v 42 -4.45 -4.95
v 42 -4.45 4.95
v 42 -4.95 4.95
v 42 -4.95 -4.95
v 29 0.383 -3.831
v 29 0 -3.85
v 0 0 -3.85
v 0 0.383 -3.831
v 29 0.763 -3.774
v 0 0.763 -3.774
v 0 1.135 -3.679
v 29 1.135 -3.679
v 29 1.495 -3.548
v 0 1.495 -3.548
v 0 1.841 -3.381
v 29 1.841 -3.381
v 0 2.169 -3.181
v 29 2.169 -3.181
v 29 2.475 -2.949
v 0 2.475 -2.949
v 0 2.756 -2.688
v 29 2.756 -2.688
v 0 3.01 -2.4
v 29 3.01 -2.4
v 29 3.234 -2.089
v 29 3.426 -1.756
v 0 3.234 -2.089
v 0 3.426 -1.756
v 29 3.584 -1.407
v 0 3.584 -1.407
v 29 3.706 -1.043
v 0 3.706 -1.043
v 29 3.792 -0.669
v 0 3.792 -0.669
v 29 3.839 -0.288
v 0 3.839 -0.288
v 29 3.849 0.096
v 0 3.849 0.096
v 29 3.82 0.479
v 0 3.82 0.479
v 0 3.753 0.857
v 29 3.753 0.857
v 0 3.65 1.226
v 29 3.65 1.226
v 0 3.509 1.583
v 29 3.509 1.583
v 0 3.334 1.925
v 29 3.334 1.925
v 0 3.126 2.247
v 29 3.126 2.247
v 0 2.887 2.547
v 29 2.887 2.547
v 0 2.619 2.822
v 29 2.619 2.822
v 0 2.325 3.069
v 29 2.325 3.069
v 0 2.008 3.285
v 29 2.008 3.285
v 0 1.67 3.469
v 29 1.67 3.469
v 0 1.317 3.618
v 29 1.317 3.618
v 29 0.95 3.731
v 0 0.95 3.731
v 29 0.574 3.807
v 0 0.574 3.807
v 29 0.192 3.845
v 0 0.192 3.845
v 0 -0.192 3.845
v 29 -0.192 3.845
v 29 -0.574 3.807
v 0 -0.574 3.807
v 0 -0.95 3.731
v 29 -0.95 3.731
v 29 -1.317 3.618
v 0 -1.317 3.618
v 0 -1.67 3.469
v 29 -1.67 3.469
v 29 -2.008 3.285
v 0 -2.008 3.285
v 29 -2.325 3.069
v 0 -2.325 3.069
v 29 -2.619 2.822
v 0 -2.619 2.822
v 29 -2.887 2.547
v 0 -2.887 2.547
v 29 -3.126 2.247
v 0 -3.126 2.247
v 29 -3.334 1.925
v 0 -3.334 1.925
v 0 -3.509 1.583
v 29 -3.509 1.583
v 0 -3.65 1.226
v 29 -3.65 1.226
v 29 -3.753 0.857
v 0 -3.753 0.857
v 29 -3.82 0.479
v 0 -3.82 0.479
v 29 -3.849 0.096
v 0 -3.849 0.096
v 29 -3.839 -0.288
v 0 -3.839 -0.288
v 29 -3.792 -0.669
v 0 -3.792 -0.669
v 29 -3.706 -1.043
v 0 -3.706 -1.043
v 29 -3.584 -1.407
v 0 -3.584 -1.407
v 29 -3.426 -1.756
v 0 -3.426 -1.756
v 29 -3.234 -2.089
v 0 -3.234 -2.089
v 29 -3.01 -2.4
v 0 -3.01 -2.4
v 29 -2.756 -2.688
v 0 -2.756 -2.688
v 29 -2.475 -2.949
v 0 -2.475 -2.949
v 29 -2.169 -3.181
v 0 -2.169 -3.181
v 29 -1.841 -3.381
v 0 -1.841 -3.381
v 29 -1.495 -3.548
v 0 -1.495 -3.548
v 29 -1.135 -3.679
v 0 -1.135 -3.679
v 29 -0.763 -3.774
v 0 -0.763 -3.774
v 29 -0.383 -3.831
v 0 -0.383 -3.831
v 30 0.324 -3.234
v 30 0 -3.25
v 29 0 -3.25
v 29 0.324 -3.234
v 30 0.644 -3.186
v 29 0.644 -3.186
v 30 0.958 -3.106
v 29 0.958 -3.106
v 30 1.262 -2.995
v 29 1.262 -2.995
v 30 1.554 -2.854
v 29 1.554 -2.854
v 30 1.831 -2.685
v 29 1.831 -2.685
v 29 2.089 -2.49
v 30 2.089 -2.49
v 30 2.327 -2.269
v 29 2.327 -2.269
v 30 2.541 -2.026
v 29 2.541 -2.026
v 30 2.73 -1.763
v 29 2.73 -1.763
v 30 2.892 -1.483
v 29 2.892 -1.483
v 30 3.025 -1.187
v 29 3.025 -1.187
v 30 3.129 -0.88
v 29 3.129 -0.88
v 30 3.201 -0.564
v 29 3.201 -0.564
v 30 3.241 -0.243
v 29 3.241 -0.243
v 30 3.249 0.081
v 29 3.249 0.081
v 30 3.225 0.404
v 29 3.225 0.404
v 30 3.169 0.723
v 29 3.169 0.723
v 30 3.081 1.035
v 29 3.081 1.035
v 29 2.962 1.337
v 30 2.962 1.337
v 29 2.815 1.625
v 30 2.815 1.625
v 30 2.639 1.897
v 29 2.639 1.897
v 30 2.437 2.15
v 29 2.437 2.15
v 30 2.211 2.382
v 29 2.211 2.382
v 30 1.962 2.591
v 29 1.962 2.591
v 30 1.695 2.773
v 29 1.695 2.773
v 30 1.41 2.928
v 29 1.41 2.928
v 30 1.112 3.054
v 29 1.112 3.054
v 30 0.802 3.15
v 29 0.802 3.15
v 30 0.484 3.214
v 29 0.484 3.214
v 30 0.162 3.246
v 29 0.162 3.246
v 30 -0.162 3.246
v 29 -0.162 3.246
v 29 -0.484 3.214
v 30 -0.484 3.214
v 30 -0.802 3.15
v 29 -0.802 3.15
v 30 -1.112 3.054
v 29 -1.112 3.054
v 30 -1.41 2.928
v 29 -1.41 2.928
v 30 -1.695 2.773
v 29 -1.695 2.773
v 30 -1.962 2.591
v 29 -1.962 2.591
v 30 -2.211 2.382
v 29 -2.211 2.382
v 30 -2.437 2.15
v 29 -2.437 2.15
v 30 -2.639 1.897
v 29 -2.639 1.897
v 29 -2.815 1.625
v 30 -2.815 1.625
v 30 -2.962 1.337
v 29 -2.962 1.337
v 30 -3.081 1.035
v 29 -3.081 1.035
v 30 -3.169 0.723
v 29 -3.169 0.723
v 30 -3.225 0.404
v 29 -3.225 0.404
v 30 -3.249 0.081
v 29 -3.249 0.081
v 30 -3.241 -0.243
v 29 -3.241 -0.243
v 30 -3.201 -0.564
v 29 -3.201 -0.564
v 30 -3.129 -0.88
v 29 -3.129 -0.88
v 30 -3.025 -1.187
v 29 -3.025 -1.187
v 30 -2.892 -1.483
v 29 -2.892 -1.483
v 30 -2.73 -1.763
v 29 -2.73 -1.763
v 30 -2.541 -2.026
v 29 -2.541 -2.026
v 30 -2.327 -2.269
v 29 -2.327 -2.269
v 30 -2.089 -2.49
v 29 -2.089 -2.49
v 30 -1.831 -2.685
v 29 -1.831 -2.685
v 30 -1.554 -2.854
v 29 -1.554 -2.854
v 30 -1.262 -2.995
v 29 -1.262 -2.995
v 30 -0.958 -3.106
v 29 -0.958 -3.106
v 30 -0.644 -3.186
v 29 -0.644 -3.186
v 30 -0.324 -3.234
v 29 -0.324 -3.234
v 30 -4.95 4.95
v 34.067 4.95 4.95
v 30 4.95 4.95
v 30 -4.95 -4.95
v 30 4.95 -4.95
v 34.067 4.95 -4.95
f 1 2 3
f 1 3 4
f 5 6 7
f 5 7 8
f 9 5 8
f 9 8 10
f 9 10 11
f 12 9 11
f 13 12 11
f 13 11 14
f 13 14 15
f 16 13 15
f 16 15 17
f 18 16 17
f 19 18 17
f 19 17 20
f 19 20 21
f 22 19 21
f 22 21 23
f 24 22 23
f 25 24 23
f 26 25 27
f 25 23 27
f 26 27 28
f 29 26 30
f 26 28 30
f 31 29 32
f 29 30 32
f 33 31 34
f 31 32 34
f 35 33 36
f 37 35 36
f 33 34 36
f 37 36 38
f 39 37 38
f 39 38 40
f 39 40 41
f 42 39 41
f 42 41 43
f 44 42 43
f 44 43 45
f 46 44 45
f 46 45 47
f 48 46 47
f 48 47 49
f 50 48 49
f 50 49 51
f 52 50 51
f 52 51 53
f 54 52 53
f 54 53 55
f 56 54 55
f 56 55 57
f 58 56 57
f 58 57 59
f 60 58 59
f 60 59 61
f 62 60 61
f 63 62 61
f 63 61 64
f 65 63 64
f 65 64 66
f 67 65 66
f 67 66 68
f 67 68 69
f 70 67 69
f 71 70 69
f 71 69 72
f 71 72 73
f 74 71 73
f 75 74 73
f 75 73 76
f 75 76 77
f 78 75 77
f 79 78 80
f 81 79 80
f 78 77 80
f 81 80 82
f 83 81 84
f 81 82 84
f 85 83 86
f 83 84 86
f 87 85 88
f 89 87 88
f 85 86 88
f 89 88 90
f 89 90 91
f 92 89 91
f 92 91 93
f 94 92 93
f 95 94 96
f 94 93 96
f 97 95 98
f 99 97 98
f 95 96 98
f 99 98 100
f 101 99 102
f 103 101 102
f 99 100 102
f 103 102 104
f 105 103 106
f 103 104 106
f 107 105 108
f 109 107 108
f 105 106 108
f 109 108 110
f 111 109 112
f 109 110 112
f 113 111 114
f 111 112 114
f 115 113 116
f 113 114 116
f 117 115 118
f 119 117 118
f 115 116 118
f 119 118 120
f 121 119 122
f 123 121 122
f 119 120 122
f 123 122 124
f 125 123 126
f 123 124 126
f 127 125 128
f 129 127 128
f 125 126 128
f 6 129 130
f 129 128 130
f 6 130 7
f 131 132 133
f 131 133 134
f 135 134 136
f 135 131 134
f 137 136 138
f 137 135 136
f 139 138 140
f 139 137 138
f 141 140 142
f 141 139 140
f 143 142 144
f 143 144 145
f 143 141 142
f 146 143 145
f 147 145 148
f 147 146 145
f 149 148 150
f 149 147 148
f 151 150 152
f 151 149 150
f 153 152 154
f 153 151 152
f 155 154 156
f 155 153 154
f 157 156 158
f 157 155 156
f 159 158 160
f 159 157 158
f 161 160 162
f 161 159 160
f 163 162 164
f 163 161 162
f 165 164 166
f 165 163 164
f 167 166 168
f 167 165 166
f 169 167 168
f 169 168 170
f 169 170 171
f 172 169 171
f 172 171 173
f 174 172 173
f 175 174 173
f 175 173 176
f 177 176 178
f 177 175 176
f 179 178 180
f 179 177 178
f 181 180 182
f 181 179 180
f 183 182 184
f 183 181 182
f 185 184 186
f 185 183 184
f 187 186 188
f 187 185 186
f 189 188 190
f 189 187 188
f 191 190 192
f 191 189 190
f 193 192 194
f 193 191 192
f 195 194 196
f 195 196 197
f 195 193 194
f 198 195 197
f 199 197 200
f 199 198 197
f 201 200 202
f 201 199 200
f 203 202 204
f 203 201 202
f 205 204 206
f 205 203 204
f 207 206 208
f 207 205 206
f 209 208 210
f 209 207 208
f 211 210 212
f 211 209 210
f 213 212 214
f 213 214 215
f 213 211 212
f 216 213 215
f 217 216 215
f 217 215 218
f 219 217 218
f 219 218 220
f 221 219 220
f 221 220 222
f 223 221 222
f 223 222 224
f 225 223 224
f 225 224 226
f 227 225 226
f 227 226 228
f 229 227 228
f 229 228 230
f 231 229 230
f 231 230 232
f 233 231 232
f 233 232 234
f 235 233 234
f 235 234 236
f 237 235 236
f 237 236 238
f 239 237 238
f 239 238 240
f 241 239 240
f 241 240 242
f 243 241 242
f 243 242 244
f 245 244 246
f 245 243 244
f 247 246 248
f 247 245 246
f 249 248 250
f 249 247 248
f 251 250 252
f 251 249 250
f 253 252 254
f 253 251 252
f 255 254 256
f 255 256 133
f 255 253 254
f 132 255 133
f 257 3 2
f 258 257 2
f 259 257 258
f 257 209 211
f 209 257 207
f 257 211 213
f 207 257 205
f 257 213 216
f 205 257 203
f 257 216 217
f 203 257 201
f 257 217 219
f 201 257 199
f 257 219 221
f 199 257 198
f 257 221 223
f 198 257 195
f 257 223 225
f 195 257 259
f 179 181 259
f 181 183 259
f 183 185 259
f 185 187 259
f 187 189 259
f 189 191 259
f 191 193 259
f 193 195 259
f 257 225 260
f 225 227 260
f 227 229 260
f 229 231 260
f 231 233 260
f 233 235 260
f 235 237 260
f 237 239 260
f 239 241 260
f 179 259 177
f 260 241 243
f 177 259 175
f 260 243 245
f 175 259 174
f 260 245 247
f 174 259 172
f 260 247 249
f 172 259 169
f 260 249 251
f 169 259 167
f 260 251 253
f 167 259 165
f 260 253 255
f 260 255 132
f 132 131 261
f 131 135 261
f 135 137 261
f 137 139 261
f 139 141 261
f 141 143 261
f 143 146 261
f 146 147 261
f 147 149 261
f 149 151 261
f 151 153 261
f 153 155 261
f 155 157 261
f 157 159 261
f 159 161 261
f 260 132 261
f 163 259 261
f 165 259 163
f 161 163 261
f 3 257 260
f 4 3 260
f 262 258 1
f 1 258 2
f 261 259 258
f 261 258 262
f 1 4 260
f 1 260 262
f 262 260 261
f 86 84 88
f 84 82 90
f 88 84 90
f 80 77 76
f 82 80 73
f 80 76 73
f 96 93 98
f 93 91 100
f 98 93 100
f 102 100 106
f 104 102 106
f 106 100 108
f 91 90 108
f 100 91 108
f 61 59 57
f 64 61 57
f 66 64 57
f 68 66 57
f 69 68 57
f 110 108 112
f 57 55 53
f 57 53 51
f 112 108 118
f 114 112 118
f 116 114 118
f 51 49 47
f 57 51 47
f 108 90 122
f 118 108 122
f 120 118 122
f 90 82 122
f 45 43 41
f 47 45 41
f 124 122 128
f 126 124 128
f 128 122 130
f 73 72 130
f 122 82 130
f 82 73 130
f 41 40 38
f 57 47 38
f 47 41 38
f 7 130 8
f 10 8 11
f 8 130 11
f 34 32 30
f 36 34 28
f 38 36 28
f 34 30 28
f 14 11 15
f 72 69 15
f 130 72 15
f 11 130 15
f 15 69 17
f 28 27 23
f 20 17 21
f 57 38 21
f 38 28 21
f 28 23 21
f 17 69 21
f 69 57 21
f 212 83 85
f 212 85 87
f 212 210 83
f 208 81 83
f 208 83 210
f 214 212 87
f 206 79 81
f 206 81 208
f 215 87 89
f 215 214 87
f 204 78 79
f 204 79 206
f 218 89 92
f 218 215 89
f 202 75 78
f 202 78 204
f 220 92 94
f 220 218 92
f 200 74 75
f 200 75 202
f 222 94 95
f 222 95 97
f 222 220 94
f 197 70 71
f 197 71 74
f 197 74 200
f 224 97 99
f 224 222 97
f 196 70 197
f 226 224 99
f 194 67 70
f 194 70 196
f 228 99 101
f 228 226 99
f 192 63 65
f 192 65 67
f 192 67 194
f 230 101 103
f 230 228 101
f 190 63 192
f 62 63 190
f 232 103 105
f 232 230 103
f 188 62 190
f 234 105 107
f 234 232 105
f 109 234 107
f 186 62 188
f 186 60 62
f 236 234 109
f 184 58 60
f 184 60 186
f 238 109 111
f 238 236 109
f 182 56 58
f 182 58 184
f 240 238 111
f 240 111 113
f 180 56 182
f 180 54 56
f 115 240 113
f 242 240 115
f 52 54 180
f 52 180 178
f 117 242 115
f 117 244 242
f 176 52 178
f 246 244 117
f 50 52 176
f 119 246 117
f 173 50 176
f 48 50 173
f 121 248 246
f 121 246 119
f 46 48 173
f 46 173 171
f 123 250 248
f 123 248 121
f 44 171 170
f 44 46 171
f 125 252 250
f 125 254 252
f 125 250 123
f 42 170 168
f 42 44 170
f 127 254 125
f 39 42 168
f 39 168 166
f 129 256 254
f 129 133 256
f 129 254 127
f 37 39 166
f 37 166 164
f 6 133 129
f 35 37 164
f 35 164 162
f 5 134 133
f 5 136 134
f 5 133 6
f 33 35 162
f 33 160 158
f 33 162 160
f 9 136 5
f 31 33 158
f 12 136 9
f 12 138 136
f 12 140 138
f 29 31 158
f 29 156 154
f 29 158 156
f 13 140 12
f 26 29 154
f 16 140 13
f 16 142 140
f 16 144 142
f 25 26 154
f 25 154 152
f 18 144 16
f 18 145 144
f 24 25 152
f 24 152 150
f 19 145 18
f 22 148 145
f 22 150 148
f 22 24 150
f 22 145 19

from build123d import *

# Parameters (mm, degrees)
SKETCH1_R           = 3.85
BOSS_EXTRUDE1_DEPTH = 30
SKETCH2_R           = 3.85
SKETCH2_R_2         = 3.25
CUT_EXTRUDE1_DEPTH  = 1
SKETCH3_W           = 9.9
SKETCH3_H           = 9.9
BOSS_EXTRUDE2_DEPTH = 12
CUT_EXTRUDE2_DEPTH  = 12


with BuildPart() as part:
    # Sketch1 → Boss-Extrude1 (new body)
    with BuildSketch(Plane(origin=(0, 0, 0), x_dir=(0, 0, -1), z_dir=(1, 0, 0))):
        Circle(SKETCH1_R)
    extrude(amount=BOSS_EXTRUDE1_DEPTH)

    # Sketch2 → Cut-Extrude1 (cut)
    with BuildSketch(Plane(origin=(30, 0, 0), x_dir=(0, 0, -1), z_dir=(1, 0, 0))):
        Circle(SKETCH2_R)
        Circle(SKETCH2_R_2, mode=Mode.SUBTRACT)
    extrude(amount=-CUT_EXTRUDE1_DEPTH, mode=Mode.SUBTRACT)

    # Sketch3 → Boss-Extrude2 (add)
    with BuildSketch(Plane(origin=(30, 0, 0), x_dir=(0, 0, -1), z_dir=(1, 0, 0))):
        Rectangle(SKETCH3_W, SKETCH3_H)
    extrude(amount=BOSS_EXTRUDE2_DEPTH)

    # Sketch4 → Cut-Extrude2 (cut)
    with BuildSketch(Plane.XY.offset(4.95)):
        Polygon((34.067156878, 4.95), (42, -4.45), (42, 4.95), align=None)
    extrude(amount=-CUT_EXTRUDE2_DEPTH, mode=Mode.SUBTRACT)


solid = part.part
